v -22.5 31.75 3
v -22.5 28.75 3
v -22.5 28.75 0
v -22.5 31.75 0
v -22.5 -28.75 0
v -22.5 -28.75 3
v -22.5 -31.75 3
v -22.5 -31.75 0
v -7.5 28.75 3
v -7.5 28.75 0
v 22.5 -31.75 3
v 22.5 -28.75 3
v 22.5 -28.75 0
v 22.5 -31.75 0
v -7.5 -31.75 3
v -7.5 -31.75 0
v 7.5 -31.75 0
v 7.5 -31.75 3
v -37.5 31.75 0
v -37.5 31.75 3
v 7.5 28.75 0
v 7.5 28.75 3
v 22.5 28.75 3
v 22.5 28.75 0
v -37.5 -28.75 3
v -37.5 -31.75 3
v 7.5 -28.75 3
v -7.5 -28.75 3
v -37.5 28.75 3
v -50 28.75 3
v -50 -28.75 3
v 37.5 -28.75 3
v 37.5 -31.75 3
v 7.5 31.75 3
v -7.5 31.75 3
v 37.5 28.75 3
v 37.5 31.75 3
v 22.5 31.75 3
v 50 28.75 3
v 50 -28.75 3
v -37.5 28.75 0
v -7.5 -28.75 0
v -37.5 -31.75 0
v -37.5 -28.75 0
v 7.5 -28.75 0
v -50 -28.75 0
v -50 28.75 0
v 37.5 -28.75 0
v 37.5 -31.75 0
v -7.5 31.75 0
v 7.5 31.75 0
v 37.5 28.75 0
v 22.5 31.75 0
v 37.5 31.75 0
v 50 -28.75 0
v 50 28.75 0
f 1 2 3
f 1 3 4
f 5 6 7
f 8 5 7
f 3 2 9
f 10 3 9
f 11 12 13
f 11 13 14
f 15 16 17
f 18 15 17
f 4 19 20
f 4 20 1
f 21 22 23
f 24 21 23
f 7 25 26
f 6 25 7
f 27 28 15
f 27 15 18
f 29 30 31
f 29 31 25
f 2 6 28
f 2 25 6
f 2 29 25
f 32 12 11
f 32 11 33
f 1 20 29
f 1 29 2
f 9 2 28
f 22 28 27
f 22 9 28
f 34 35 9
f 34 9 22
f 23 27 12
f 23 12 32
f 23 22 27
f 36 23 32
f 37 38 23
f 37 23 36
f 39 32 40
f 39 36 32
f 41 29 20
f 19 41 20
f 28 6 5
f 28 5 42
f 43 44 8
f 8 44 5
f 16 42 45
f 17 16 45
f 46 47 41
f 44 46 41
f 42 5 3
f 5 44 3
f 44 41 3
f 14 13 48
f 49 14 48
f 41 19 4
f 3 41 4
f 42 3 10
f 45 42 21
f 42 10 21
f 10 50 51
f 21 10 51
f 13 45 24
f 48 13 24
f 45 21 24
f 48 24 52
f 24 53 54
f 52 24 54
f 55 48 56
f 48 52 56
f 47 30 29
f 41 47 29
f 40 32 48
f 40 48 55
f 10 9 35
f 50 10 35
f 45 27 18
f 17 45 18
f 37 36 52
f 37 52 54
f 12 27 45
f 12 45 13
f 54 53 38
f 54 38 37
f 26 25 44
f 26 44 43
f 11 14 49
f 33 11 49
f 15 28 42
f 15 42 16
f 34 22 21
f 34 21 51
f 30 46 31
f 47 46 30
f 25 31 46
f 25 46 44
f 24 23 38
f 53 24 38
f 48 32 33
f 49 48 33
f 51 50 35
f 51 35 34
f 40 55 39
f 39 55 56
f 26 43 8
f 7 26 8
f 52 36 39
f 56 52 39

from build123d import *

# Parameters (mm, degrees)
SKETCH1_W           = 100
SKETCH1_H           = 63.5
BOSS_EXTRUDE1_DEPTH = 3
SKETCH2_W           = 12.5
SKETCH2_H           = 3
SKETCH2_W_2         = 15
CUT_EXTRUDE1_DEPTH  = 4


with BuildPart() as part:
    # Sketch1 → Boss-Extrude1 (new body)
    with BuildSketch(Plane.XY):
        Rectangle(SKETCH1_W, SKETCH1_H)
    extrude(amount=BOSS_EXTRUDE1_DEPTH)

    # Sketch2 → Cut-Extrude1 (cut, through all)
    with BuildSketch(Plane.XY.offset(3)):
        with Locations((-43.75, 30.25)):
            Rectangle(SKETCH2_W, SKETCH2_H)
        with Locations((-15, 30.25)):
            Rectangle(SKETCH2_W_2, SKETCH2_H)
        with Locations((15, 30.25)):
            Rectangle(SKETCH2_W_2, SKETCH2_H)
        with Locations((43.75, 30.25)):
            Rectangle(SKETCH2_W, SKETCH2_H)
    cut_extrude1 = extrude(amount=-CUT_EXTRUDE1_DEPTH, mode=Mode.SUBTRACT)

    # Mirror2: Cut-Extrude1 across plane
    add(cut_extrude1.mirror(Plane.ZX), mode=Mode.SUBTRACT)


solid = part.part
